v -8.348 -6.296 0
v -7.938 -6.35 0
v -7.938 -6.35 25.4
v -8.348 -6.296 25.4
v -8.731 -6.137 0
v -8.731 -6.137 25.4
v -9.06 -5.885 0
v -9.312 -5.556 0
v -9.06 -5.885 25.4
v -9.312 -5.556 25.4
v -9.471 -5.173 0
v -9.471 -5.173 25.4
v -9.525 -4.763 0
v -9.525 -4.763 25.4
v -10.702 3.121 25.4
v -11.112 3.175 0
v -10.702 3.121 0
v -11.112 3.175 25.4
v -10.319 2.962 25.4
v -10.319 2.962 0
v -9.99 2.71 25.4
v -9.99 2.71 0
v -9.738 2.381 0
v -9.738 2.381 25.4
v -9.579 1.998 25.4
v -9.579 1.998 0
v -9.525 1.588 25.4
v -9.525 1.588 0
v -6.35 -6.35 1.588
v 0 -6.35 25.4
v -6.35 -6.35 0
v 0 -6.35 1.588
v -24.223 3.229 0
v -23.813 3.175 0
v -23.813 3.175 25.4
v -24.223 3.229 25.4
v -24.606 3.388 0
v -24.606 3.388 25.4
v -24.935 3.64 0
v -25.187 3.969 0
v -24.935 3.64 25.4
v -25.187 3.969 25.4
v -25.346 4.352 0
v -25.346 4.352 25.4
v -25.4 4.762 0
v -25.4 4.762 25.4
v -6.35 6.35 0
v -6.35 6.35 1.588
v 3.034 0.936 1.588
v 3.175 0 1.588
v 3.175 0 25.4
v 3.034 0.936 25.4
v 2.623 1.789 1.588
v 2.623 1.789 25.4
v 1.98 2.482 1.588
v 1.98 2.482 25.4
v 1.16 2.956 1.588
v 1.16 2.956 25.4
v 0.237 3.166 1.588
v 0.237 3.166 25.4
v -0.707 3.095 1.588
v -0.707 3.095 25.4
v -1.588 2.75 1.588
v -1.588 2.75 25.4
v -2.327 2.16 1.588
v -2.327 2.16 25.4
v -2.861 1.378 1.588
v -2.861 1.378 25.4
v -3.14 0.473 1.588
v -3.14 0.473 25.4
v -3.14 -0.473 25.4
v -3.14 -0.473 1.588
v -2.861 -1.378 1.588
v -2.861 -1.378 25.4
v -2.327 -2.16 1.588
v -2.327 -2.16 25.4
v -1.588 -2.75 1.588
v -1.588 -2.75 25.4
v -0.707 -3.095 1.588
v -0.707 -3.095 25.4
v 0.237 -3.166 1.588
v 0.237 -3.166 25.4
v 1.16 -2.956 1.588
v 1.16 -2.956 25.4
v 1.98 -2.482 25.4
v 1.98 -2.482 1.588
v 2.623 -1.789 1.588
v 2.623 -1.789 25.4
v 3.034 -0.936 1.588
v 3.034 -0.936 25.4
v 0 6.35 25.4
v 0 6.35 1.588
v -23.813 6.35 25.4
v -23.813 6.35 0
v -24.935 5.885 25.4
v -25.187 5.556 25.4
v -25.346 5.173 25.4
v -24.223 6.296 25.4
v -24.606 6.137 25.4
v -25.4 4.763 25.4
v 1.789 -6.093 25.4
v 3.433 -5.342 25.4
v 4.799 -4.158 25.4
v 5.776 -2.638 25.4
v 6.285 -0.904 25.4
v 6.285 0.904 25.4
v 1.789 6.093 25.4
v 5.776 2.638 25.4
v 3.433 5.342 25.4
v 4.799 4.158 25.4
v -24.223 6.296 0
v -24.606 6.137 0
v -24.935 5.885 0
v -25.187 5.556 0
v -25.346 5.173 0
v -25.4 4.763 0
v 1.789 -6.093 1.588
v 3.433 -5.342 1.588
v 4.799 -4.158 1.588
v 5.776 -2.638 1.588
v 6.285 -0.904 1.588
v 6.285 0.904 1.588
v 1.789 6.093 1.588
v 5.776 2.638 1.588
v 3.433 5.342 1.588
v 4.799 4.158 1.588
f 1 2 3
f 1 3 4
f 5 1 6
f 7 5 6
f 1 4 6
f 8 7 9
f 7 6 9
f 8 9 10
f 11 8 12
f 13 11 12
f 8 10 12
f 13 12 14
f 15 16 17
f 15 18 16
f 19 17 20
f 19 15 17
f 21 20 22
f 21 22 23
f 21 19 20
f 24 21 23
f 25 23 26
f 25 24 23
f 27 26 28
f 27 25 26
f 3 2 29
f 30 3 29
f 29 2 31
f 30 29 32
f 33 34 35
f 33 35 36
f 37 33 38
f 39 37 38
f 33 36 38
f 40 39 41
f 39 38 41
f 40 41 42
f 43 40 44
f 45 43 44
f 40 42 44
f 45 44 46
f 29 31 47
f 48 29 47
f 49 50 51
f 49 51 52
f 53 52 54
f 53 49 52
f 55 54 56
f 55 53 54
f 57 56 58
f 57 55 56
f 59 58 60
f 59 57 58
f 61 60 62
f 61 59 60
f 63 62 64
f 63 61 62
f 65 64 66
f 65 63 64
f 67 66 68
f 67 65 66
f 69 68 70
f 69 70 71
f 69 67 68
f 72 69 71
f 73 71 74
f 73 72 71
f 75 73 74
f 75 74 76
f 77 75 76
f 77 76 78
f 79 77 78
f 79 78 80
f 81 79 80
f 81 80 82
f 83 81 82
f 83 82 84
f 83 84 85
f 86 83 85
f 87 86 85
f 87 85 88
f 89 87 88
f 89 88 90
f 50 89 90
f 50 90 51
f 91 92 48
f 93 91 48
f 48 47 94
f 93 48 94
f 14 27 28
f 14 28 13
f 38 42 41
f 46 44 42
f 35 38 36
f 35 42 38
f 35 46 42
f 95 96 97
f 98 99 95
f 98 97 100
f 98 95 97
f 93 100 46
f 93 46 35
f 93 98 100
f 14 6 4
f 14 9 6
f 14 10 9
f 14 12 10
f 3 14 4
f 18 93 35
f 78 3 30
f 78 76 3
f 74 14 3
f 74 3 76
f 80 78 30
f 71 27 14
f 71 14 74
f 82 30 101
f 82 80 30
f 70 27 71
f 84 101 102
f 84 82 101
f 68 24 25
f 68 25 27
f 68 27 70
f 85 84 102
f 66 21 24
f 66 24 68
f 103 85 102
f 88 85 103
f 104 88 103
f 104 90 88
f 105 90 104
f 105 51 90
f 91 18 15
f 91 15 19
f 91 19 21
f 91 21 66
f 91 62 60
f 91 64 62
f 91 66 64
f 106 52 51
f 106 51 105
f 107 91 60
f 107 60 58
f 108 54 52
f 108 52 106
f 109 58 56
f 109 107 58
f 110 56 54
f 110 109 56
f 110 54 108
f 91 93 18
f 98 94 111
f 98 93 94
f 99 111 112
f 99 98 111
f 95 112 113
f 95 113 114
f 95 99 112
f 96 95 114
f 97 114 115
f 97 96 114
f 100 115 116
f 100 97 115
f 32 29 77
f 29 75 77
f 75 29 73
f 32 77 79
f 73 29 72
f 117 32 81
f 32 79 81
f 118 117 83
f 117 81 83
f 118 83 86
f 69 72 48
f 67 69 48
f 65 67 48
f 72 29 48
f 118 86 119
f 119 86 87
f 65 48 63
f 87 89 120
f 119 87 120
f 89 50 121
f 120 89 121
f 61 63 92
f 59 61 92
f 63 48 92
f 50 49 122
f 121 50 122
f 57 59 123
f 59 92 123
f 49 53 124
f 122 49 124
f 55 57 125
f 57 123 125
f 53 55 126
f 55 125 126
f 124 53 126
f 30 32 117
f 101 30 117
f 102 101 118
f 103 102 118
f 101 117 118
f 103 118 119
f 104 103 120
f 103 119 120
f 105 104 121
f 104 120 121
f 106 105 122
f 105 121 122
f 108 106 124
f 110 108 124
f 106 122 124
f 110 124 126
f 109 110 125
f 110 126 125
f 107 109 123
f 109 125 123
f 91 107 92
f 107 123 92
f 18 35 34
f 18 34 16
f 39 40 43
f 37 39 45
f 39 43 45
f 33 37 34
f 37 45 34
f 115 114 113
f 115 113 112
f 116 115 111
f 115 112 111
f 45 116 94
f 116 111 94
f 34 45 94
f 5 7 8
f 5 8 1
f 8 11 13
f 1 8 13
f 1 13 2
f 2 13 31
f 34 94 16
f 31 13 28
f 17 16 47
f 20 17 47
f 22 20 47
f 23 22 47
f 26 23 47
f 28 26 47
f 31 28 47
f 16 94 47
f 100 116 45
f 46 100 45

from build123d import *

# Parameters (mm, degrees)
SKETCH1_R           = 3.175
BOSS_EXTRUDE1_DEPTH = 25.4
CUT_EXTRUDE1_START  = -25.4
SKETCH2_W           = 12.7
SKETCH2_H           = 12.7
CUT_EXTRUDE1_DEPTH  = 1.5875
FILLET1_R           = 1.5875


with BuildPart() as part:
    # Sketch1 → Boss-Extrude1 (new body)
    with BuildSketch(Plane.XY):
        with BuildLine():
            Line((-25.4, 3.175), (-9.525, 3.175))
            Line((-9.525, 3.175), (-9.525, -6.35))
            Line((-9.525, -6.35), (0, -6.35))
            ThreePointArc((0, -6.35), (6.35, 0), (0, 6.35))
            Line((0, 6.35), (-25.4, 6.35))
            Line((-25.4, 6.35), (-25.4, 3.175))
        make_face()
        Circle(SKETCH1_R, mode=Mode.SUBTRACT)
    extrude(amount=BOSS_EXTRUDE1_DEPTH)

    # Sketch2 → Cut-Extrude1 (cut)
    with BuildSketch(Plane.XY.offset(25.4).offset(CUT_EXTRUDE1_START)):
        Rectangle(SKETCH2_W, SKETCH2_H)
    extrude(amount=CUT_EXTRUDE1_DEPTH, mode=Mode.SUBTRACT)

    # Fillet1
    fillet1_edges = [part.edges().sort_by_distance(p)[0] for p in [
        (-9.525, -6.35, 12.7),
        (-9.525, 3.175, 12.7),
        (-25.4, 6.35, 12.7),
        (-25.4, 3.175, 12.7),
    ]]
    fillet(fillet1_edges, radius=FILLET1_R - 0.0001)  # a hair under: the kernel refuses the full size


solid = part.part
